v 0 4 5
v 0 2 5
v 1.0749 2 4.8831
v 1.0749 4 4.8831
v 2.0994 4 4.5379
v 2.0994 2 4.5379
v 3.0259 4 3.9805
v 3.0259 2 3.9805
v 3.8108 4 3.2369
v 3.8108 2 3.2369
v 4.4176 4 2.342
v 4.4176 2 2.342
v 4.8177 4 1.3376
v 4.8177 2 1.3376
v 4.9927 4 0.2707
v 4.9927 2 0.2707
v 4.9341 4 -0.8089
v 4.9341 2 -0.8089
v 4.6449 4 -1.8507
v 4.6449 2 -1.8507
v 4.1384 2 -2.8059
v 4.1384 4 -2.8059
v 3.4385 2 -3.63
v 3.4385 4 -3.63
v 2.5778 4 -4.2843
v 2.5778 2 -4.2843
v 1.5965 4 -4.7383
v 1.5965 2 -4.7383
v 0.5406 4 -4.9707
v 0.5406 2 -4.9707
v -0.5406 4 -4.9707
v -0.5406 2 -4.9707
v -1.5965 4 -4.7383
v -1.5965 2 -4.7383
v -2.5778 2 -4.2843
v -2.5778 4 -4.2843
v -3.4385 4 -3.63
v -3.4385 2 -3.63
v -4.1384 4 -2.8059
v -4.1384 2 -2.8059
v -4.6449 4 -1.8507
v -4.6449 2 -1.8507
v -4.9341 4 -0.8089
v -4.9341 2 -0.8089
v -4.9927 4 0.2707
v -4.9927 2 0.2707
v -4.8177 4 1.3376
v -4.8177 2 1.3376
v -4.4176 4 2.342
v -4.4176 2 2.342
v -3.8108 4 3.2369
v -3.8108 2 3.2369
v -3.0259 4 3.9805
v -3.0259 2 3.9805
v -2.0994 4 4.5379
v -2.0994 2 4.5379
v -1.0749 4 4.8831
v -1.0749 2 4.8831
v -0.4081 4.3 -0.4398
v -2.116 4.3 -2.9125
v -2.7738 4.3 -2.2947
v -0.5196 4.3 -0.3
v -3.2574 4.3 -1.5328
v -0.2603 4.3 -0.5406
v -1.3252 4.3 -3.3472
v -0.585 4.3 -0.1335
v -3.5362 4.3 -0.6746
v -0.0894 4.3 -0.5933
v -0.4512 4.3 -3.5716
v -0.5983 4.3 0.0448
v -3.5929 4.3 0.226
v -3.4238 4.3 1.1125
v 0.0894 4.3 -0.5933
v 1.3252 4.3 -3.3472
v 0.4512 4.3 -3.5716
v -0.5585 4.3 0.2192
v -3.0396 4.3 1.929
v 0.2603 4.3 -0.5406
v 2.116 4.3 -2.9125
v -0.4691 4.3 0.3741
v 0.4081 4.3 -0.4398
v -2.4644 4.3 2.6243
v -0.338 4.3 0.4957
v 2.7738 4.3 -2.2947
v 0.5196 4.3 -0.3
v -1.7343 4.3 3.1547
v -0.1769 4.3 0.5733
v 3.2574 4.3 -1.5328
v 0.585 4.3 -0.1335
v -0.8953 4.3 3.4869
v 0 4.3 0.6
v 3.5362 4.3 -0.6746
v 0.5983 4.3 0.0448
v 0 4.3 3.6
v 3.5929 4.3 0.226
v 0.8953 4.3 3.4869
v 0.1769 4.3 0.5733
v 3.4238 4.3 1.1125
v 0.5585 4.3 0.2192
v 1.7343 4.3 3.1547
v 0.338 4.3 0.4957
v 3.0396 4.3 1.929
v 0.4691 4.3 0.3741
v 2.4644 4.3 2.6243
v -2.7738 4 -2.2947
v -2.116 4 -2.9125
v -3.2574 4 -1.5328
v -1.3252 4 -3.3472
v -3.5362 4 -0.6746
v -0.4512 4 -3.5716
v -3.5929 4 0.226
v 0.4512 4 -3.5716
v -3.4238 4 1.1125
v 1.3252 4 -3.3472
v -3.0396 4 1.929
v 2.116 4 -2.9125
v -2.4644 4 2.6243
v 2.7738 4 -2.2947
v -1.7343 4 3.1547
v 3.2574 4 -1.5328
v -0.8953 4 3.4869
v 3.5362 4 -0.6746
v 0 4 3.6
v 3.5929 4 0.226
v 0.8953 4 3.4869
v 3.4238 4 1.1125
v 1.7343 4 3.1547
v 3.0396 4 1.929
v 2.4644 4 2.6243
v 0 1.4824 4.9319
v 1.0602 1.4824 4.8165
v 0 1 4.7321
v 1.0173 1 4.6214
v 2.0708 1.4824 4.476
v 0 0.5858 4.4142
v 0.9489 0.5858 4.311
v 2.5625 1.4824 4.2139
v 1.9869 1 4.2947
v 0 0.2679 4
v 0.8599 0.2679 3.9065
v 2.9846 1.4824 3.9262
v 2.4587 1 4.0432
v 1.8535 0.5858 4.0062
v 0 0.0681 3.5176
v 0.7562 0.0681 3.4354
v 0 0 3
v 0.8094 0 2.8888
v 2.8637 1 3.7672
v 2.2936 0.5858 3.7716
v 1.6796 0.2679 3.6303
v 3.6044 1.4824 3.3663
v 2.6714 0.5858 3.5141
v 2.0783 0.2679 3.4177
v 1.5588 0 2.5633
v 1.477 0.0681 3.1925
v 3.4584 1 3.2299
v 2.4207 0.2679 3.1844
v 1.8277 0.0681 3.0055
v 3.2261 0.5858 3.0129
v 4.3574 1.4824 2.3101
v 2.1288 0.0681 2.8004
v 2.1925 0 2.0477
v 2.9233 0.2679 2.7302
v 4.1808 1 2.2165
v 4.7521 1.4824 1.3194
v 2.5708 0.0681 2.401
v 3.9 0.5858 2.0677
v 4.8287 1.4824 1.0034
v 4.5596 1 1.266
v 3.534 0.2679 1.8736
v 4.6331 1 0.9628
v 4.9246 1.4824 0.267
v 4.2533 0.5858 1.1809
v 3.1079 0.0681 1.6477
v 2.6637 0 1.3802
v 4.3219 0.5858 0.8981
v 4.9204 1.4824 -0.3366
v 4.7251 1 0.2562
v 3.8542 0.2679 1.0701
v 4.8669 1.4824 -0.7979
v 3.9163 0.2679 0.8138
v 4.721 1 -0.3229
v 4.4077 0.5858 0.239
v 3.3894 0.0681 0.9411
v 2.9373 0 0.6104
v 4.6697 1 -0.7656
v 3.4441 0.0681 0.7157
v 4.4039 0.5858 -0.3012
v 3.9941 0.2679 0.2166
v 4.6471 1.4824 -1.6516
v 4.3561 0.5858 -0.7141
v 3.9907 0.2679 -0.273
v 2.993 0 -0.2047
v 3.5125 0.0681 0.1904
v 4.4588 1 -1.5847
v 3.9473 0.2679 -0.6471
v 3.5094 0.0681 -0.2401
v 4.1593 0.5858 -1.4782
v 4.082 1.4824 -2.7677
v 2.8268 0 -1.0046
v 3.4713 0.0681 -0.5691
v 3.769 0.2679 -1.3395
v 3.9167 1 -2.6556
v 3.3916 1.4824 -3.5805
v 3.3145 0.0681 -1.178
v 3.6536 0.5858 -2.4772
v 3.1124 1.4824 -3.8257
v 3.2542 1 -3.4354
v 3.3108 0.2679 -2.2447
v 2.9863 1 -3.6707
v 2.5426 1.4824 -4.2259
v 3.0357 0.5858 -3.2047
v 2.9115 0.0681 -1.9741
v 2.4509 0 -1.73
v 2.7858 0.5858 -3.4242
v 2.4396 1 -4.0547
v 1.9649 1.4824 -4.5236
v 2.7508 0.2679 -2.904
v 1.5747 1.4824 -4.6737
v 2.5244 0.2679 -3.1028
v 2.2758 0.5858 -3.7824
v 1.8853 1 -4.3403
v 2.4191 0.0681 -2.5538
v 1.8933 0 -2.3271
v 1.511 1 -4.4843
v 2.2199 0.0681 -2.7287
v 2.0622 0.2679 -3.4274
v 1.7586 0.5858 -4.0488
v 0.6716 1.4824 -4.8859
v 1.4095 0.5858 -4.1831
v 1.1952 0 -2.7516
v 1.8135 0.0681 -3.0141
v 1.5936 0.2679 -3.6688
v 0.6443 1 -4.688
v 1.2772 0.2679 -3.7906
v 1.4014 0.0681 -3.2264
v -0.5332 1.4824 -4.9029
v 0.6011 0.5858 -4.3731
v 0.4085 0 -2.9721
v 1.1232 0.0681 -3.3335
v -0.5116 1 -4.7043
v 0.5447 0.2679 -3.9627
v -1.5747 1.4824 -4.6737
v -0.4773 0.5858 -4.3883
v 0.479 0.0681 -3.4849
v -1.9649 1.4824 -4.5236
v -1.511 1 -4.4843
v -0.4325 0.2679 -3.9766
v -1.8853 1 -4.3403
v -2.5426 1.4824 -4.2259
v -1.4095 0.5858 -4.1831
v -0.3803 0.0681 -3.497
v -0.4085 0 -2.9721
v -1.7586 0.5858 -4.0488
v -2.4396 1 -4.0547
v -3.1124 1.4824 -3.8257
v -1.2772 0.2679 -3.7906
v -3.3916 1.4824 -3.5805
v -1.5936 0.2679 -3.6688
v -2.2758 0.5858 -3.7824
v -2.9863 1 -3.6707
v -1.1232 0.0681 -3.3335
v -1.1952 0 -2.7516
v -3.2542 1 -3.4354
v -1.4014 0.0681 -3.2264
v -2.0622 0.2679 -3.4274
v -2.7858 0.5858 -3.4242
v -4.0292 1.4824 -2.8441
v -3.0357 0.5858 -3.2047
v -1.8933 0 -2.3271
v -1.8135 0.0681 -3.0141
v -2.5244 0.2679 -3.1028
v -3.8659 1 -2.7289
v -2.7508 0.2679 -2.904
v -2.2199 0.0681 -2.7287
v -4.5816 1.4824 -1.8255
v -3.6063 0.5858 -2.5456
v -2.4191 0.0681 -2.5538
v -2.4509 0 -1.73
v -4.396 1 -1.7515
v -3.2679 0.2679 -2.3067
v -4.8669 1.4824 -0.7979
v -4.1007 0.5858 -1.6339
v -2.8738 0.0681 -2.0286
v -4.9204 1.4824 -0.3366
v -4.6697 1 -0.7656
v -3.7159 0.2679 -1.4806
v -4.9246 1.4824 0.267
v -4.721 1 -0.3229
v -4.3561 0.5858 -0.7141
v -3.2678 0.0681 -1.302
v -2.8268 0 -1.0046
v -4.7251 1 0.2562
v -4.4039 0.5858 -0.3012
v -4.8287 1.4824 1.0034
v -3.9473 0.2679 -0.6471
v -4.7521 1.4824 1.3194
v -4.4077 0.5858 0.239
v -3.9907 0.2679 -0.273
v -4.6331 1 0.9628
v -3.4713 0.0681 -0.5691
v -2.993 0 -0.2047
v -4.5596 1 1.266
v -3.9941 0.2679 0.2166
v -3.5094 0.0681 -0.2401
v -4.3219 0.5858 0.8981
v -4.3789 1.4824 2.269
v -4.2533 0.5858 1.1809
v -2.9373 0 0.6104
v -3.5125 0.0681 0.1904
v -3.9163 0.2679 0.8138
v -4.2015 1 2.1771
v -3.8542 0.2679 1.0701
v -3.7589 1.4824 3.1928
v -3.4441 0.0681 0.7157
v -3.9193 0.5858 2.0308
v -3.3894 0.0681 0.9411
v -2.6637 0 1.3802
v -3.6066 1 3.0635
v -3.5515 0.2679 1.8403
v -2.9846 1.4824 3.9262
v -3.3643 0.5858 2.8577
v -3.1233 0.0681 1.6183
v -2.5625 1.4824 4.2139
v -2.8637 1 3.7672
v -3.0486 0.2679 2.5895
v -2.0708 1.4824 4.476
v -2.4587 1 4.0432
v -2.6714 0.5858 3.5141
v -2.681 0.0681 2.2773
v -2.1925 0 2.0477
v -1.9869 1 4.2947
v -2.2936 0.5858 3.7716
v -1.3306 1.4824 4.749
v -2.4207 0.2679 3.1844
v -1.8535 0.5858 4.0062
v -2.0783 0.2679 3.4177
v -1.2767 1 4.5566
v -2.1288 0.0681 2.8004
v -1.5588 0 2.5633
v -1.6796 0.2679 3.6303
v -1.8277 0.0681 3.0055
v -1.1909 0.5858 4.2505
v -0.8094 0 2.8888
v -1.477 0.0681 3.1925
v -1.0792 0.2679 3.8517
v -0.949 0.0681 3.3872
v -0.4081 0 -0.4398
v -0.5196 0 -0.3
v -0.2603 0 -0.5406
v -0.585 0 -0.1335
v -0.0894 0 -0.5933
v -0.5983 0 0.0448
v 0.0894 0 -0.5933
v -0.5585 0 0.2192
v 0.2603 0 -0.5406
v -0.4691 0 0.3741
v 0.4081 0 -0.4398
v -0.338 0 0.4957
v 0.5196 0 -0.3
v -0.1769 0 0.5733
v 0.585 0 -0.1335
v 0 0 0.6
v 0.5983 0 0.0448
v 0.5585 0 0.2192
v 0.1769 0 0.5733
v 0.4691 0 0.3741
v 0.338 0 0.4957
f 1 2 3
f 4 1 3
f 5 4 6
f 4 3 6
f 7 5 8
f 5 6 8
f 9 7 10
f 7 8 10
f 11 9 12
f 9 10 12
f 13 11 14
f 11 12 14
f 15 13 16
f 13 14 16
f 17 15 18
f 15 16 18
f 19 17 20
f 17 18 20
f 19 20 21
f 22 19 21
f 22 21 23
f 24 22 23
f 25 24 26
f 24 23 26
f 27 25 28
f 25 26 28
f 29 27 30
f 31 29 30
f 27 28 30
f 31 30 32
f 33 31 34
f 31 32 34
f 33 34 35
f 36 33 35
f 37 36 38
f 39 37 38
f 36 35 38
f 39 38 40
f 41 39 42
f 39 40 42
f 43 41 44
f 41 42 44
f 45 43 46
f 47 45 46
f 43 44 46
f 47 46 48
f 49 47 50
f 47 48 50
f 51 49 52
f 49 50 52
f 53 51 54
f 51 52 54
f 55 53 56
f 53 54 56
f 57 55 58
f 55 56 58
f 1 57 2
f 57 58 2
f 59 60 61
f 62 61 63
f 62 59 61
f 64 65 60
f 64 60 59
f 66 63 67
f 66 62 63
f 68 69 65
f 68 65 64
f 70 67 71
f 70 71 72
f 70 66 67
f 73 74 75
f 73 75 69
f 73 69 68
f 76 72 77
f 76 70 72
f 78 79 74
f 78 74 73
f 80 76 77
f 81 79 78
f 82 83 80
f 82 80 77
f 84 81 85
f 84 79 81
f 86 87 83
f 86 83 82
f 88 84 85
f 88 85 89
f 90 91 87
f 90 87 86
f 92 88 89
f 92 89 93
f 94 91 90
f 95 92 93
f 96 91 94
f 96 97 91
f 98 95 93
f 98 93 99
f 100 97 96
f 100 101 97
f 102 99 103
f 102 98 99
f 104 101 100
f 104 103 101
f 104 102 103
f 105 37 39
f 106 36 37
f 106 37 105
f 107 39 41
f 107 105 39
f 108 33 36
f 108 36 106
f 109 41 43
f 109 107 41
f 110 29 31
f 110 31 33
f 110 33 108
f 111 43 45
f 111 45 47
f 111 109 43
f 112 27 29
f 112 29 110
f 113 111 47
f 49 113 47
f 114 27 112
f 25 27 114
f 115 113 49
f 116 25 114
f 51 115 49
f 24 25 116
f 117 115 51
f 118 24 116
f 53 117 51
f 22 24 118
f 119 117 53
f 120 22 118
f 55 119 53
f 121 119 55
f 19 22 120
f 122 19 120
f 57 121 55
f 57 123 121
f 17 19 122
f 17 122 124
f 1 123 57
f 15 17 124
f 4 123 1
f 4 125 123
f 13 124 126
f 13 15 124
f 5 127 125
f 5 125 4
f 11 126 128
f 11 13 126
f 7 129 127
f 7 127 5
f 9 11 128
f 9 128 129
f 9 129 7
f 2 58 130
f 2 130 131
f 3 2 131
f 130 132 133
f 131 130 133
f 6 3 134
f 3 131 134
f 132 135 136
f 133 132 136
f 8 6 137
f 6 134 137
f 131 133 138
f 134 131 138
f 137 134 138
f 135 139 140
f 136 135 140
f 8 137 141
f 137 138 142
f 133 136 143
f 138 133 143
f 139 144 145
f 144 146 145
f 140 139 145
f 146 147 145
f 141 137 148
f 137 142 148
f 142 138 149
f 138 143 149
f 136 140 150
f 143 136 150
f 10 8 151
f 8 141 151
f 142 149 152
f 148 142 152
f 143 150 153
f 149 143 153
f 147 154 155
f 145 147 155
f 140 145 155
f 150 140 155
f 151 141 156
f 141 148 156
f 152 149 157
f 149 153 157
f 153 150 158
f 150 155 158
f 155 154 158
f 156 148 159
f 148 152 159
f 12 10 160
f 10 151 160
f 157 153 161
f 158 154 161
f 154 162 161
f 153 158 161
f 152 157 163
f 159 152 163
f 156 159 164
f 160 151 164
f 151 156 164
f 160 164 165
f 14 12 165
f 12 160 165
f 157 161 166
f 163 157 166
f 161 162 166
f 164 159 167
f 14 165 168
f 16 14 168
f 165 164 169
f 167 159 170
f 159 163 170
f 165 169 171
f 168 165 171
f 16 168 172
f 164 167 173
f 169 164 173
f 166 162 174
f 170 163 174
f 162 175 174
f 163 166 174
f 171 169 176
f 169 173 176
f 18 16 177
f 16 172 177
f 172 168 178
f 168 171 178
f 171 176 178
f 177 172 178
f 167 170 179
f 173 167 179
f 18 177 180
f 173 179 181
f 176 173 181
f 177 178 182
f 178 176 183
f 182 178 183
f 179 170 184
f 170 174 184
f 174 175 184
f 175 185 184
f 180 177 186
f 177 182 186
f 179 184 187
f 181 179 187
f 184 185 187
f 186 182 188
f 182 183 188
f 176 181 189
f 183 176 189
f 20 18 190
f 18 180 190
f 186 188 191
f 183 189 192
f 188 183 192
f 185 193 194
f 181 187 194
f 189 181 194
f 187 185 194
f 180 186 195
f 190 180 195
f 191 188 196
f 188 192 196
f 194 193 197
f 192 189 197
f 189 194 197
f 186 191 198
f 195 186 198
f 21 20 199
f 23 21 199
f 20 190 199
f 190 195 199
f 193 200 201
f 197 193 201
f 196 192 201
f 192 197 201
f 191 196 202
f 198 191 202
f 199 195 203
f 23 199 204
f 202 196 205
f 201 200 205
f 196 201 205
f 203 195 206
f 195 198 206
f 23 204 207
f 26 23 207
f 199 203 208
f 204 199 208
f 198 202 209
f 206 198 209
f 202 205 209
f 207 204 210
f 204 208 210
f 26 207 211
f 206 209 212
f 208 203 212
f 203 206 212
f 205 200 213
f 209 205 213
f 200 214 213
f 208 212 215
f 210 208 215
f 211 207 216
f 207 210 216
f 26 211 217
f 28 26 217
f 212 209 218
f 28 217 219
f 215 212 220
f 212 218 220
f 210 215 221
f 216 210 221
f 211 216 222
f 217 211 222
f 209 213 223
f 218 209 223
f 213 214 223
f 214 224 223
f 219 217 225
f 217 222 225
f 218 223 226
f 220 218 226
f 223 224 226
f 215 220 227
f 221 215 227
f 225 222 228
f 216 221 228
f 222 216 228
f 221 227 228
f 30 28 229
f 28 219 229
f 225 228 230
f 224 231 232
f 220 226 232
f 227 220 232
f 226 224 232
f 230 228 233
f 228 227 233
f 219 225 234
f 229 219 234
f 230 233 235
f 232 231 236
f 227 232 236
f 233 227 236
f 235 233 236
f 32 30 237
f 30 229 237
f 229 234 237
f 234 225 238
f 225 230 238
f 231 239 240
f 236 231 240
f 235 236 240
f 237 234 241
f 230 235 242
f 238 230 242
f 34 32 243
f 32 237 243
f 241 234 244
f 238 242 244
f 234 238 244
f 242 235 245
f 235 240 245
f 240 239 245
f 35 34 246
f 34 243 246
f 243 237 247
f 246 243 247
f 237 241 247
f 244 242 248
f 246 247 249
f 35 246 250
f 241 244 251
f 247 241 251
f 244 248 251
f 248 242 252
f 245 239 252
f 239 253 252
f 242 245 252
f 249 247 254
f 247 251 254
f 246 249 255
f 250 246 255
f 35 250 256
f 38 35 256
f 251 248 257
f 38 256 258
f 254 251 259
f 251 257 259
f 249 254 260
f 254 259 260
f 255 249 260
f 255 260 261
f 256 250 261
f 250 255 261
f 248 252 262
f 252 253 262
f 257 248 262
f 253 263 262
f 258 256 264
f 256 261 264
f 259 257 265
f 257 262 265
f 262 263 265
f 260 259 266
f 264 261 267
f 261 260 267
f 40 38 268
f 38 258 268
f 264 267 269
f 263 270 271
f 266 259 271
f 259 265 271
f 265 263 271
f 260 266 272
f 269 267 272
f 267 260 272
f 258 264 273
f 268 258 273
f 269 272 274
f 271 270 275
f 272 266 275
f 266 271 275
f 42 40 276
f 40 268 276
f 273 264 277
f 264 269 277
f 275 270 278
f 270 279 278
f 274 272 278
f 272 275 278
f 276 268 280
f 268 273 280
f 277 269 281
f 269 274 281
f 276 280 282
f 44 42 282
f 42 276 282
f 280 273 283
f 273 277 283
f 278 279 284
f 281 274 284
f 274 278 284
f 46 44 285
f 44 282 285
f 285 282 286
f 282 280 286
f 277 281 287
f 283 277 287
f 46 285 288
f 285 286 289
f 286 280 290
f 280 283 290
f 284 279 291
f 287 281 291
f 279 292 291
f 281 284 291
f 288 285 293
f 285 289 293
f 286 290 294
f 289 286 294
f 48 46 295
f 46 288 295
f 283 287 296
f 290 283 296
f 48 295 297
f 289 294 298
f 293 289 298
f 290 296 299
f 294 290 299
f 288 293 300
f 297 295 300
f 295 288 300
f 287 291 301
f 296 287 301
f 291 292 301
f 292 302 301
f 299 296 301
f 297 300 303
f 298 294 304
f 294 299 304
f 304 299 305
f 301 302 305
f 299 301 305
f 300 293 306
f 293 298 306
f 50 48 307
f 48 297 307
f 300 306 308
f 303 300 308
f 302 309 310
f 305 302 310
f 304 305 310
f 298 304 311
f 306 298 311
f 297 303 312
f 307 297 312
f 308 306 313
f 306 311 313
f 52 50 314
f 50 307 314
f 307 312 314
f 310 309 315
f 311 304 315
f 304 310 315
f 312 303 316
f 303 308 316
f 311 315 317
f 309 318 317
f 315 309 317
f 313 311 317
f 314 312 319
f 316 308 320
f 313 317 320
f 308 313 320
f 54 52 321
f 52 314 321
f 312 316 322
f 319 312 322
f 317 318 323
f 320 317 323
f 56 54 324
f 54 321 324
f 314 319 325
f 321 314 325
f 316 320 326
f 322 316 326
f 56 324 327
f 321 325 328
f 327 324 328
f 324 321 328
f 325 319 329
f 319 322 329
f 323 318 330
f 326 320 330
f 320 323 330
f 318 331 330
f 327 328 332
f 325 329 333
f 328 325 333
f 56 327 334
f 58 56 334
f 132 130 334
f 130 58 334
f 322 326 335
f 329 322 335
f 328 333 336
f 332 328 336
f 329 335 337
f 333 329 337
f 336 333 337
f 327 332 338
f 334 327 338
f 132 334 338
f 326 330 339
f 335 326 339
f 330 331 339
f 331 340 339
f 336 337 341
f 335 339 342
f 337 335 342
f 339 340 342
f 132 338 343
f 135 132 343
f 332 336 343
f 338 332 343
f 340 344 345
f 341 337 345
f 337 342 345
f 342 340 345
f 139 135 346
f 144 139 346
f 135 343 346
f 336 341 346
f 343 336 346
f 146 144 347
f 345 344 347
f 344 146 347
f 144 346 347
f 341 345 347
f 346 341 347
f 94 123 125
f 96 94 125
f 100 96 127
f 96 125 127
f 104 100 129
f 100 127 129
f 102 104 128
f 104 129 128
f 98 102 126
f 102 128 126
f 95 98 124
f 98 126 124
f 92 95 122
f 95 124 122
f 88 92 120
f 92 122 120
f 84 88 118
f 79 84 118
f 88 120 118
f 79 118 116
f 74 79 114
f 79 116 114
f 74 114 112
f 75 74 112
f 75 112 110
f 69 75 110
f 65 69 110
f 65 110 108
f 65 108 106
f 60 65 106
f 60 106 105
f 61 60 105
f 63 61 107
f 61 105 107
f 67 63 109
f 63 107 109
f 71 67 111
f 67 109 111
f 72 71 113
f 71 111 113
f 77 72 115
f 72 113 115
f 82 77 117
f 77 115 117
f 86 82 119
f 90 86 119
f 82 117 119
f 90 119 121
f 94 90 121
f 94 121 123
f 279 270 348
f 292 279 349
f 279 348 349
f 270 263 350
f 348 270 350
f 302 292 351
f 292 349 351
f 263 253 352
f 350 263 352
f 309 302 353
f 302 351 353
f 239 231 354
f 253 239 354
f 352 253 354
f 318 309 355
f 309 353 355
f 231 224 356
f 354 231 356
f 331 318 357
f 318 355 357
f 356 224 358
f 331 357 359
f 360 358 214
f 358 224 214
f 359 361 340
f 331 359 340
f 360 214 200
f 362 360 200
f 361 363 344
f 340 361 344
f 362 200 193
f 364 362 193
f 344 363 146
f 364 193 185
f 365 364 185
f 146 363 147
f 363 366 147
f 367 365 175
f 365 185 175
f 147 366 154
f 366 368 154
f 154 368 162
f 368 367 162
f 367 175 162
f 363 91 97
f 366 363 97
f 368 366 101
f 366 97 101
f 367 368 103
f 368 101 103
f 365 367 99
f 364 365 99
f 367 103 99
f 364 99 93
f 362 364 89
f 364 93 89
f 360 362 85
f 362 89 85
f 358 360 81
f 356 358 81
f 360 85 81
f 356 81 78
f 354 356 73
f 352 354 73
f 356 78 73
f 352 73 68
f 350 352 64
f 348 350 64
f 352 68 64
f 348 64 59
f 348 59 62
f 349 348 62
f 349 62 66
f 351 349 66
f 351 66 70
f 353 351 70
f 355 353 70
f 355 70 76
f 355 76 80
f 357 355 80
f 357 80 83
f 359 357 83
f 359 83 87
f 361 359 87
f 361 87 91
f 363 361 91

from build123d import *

# Parameters (mm, degrees)
SKETCH_1_R          = 5
EXTRUDE_1_DEPTH     = 4
SKETCH_2_R          = 3.6
EXTRUDE_2_DEPTH     = 0.3
FILLET_1_R          = 2
SKETCH_3_R          = 0.6
CUT_EXTRUDE_1_DEPTH = 9.275868534


with BuildPart() as part:
    # 草图1 → 凸台-拉伸1 (new body)
    with BuildSketch(Plane(origin=(0, 0, 0), x_dir=(1, 0, 0), z_dir=(0, 1, 0))):
        with Locations(Location((0, 0, 0), (0, 0, 270))):
            Circle(SKETCH_1_R)
    extrude(amount=EXTRUDE_1_DEPTH)

    # 草图2 → 凸台-拉伸2 (add)
    with BuildSketch(Plane(origin=(0, 4, 0), x_dir=(1, 0, 0), z_dir=(0, 1, 0))):
        with Locations(Location((0, 0, 0), (0, 0, 270))):
            Circle(SKETCH_2_R)
    extrude(amount=EXTRUDE_2_DEPTH)

    # 圆角1
    fillet_1_edges = [part.edges().sort_by_distance(p)[0] for p in [
        (0, 0, -5),
    ]]
    fillet(fillet_1_edges, radius=FILLET_1_R)

    # 草图3 → 切除-拉伸1 (cut, through all)
    with BuildSketch(Plane(origin=(0, 4.3, 0), x_dir=(1, 0, 0), z_dir=(0, 1, 0))):
        with Locations(Location((0, 0, 0), (0, 0, 270))):
            Circle(SKETCH_3_R)
    extrude(amount=-CUT_EXTRUDE_1_DEPTH, mode=Mode.SUBTRACT)


solid = part.part
